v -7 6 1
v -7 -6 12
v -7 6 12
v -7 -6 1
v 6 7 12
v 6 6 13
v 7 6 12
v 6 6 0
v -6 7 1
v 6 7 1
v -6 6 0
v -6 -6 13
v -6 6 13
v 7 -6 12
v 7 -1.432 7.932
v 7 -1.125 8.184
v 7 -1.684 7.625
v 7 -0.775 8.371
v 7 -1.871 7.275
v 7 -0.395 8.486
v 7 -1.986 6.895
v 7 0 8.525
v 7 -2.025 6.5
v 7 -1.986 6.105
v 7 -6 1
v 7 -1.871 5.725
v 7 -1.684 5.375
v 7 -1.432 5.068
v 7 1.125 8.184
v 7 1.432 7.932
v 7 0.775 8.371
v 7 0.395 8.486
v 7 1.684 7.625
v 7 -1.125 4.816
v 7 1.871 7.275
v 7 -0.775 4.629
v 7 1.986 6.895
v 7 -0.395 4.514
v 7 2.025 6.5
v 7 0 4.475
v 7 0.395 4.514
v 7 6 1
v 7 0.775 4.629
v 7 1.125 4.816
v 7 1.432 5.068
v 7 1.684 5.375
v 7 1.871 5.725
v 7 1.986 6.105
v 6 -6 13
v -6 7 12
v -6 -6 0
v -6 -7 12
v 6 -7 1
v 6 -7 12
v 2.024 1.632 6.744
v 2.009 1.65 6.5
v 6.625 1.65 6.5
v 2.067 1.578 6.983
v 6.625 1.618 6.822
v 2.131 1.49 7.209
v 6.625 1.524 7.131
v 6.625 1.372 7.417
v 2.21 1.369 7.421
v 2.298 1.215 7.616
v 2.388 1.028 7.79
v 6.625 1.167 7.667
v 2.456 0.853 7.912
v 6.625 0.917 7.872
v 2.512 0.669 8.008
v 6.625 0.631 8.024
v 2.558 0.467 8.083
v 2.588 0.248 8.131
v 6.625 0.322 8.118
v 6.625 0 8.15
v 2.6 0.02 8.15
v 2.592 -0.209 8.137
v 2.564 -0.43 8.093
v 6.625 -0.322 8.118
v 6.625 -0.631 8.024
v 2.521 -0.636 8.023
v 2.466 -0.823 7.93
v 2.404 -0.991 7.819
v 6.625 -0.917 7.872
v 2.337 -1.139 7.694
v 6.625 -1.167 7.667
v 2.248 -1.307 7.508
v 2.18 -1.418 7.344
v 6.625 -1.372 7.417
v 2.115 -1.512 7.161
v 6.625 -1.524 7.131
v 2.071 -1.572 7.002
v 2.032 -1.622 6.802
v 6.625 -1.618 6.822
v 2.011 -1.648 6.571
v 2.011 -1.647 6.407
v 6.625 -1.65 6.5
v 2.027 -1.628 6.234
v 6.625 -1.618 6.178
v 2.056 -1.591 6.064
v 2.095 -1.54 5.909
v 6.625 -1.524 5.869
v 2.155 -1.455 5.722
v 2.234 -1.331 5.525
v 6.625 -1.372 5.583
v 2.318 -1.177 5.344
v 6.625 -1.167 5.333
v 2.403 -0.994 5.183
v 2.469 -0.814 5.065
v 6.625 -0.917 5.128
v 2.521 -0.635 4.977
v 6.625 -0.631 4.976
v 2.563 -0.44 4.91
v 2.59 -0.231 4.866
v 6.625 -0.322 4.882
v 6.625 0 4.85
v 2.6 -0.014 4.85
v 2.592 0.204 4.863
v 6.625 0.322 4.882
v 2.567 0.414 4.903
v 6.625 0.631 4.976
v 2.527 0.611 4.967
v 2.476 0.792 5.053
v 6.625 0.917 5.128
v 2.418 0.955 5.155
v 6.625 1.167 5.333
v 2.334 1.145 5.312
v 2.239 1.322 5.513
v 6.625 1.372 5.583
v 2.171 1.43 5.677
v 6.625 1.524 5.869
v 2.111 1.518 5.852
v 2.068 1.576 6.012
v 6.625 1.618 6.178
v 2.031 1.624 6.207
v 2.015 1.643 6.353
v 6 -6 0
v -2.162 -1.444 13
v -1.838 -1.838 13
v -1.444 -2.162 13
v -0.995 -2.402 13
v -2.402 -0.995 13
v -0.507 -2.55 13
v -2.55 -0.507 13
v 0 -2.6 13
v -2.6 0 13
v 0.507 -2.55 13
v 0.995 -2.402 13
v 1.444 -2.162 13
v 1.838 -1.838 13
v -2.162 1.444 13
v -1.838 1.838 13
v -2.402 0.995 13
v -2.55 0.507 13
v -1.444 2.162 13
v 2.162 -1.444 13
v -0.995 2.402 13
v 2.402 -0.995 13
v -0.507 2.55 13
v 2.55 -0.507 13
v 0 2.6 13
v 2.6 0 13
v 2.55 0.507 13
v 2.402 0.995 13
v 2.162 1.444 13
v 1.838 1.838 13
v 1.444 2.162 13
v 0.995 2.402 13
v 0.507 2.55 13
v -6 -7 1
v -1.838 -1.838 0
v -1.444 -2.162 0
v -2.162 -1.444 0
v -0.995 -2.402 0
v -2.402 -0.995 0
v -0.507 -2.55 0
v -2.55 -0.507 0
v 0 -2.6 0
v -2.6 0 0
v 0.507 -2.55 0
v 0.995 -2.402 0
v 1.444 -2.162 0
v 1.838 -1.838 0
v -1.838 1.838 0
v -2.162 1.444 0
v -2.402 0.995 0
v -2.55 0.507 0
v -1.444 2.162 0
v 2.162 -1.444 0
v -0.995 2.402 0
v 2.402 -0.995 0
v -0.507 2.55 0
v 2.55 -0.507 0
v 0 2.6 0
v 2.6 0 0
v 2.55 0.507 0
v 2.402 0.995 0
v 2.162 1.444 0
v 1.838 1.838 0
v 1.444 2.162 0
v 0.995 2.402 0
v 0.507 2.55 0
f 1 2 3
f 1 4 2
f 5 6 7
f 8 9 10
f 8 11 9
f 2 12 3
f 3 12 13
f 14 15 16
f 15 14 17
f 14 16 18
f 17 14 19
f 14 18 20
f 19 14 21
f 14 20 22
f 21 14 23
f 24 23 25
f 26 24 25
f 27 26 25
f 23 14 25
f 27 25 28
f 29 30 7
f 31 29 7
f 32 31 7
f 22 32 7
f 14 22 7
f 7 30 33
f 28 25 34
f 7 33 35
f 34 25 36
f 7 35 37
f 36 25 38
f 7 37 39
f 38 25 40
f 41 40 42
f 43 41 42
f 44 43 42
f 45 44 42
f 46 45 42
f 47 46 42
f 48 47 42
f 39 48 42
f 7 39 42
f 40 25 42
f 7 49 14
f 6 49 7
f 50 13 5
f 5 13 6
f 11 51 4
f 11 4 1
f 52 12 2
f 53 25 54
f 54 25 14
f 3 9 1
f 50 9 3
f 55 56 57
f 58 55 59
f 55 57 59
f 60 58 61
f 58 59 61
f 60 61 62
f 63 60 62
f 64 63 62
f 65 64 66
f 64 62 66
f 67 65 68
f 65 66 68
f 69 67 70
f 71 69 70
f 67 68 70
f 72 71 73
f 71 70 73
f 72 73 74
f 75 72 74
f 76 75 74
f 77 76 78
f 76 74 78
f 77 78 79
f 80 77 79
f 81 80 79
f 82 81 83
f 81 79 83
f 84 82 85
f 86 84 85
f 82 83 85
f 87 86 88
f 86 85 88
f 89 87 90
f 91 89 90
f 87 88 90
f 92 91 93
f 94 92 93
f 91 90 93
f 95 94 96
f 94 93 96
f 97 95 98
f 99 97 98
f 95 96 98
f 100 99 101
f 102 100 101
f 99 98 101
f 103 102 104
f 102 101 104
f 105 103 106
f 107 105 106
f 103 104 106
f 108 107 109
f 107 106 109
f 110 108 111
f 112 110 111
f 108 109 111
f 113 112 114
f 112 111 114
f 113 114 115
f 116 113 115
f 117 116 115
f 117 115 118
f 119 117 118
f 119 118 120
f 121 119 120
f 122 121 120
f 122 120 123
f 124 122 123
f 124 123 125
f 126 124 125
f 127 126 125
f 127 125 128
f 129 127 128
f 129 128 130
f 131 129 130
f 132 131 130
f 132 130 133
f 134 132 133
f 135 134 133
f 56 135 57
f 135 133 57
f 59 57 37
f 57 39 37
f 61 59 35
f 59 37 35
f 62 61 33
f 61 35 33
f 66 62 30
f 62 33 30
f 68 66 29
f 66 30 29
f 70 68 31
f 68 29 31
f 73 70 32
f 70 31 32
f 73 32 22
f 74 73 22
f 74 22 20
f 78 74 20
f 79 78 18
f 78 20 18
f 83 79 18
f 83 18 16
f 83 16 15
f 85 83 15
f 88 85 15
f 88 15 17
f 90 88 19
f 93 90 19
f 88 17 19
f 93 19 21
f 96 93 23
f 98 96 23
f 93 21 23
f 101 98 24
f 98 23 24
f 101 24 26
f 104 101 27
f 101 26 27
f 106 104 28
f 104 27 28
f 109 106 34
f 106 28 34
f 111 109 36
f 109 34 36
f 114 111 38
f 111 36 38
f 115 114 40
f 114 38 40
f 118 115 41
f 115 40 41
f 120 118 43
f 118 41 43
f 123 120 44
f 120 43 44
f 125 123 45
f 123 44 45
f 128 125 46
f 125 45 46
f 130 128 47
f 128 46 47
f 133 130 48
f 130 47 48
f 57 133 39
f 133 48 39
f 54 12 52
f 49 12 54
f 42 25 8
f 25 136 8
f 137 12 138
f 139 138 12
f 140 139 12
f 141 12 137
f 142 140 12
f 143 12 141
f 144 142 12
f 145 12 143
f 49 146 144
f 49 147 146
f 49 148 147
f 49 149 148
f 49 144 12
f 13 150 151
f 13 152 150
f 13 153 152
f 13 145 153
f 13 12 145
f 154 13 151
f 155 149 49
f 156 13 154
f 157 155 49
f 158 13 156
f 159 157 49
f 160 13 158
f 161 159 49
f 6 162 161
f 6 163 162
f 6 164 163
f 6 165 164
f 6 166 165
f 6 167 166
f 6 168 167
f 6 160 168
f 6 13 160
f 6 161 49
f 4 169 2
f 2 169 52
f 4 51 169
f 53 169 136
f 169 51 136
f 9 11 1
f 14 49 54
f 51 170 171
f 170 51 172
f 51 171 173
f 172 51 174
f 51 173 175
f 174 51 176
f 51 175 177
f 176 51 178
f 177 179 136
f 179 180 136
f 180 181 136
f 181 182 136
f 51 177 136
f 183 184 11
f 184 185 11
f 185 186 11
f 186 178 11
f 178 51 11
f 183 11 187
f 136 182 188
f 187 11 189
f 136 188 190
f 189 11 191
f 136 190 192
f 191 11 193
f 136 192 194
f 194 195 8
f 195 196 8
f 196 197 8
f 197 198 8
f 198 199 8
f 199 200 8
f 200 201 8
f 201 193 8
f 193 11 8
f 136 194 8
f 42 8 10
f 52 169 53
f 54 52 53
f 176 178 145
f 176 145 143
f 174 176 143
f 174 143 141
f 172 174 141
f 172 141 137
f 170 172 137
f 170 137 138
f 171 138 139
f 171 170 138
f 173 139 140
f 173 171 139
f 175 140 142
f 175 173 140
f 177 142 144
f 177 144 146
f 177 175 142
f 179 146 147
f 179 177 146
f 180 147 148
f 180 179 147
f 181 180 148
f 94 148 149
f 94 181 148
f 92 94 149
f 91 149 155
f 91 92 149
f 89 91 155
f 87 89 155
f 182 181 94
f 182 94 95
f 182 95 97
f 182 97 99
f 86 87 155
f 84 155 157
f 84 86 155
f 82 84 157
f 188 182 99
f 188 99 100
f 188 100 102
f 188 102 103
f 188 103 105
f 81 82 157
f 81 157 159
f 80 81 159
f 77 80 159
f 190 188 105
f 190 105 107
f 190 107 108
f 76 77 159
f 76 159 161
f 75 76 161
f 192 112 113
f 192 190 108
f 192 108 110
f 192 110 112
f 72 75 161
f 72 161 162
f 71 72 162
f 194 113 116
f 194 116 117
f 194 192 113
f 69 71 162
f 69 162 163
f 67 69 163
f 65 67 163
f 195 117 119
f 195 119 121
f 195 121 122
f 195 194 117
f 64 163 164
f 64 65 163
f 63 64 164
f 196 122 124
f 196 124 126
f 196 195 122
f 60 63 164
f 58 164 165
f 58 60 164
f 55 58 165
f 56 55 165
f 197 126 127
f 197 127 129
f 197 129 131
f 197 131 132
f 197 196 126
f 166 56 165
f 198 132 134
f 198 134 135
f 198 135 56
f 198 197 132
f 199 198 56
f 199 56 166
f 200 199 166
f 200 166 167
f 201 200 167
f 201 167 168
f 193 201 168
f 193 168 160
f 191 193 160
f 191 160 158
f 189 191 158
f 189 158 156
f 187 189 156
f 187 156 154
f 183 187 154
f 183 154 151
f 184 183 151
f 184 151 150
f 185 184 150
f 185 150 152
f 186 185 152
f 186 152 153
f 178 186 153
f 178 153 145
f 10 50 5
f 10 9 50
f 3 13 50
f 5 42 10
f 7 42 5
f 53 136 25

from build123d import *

# Parameters (mm, degrees)
SKETCH1_W           = 14
SKETCH1_H           = 14
SKETCH1_R           = 2.6
BOSS_EXTRUDE1_DEPTH = 13
CHAMFER1_SIZE       = 1


# Read off the part's stored shape, not the designer's step: M4 Tapped Hole1
with BuildPart() as part:
    # Sketch1 → Boss-Extrude1 (new body)
    with BuildSketch(Plane.XY):
        Rectangle(SKETCH1_W, SKETCH1_H)
        with Locations(Location((0, 0, 0), (0, 0, 180))):
            Circle(SKETCH1_R, mode=Mode.SUBTRACT)
    extrude(amount=BOSS_EXTRUDE1_DEPTH)

    # Chamfer1
    chamfer1_edges = [part.edges().sort_by_distance(p)[0] for p in [
        (7, 0, 13),
        (0, 7, 13),
        (-7, 0, 13),
        (0, 7, 0),
        (7, 0, 0),
        (0, -7, 0),
        (-7, 0, 0),
        (0, -7, 13),
        (-7, 7, 6.5),
        (7, 7, 6.5),
        (7, -7, 6.5),
        (-7, -7, 6.5),
    ]]
    chamfer(chamfer1_edges, length=CHAMFER1_SIZE)

    # M4 Tapped Hole1 outline → M4 Tapped Hole1 (revolve, cut)
    with BuildSketch(Plane.YX.offset(-6.5)):
        Polygon((0, 2.009055278), (1.65, 2.009055278), (1.65, 6.625), (2.025, 7), (0, 7), align=None)
    revolve(axis=Axis((0, 0, 6.5), (1, 0, 0)), mode=Mode.SUBTRACT)


solid = part.part
